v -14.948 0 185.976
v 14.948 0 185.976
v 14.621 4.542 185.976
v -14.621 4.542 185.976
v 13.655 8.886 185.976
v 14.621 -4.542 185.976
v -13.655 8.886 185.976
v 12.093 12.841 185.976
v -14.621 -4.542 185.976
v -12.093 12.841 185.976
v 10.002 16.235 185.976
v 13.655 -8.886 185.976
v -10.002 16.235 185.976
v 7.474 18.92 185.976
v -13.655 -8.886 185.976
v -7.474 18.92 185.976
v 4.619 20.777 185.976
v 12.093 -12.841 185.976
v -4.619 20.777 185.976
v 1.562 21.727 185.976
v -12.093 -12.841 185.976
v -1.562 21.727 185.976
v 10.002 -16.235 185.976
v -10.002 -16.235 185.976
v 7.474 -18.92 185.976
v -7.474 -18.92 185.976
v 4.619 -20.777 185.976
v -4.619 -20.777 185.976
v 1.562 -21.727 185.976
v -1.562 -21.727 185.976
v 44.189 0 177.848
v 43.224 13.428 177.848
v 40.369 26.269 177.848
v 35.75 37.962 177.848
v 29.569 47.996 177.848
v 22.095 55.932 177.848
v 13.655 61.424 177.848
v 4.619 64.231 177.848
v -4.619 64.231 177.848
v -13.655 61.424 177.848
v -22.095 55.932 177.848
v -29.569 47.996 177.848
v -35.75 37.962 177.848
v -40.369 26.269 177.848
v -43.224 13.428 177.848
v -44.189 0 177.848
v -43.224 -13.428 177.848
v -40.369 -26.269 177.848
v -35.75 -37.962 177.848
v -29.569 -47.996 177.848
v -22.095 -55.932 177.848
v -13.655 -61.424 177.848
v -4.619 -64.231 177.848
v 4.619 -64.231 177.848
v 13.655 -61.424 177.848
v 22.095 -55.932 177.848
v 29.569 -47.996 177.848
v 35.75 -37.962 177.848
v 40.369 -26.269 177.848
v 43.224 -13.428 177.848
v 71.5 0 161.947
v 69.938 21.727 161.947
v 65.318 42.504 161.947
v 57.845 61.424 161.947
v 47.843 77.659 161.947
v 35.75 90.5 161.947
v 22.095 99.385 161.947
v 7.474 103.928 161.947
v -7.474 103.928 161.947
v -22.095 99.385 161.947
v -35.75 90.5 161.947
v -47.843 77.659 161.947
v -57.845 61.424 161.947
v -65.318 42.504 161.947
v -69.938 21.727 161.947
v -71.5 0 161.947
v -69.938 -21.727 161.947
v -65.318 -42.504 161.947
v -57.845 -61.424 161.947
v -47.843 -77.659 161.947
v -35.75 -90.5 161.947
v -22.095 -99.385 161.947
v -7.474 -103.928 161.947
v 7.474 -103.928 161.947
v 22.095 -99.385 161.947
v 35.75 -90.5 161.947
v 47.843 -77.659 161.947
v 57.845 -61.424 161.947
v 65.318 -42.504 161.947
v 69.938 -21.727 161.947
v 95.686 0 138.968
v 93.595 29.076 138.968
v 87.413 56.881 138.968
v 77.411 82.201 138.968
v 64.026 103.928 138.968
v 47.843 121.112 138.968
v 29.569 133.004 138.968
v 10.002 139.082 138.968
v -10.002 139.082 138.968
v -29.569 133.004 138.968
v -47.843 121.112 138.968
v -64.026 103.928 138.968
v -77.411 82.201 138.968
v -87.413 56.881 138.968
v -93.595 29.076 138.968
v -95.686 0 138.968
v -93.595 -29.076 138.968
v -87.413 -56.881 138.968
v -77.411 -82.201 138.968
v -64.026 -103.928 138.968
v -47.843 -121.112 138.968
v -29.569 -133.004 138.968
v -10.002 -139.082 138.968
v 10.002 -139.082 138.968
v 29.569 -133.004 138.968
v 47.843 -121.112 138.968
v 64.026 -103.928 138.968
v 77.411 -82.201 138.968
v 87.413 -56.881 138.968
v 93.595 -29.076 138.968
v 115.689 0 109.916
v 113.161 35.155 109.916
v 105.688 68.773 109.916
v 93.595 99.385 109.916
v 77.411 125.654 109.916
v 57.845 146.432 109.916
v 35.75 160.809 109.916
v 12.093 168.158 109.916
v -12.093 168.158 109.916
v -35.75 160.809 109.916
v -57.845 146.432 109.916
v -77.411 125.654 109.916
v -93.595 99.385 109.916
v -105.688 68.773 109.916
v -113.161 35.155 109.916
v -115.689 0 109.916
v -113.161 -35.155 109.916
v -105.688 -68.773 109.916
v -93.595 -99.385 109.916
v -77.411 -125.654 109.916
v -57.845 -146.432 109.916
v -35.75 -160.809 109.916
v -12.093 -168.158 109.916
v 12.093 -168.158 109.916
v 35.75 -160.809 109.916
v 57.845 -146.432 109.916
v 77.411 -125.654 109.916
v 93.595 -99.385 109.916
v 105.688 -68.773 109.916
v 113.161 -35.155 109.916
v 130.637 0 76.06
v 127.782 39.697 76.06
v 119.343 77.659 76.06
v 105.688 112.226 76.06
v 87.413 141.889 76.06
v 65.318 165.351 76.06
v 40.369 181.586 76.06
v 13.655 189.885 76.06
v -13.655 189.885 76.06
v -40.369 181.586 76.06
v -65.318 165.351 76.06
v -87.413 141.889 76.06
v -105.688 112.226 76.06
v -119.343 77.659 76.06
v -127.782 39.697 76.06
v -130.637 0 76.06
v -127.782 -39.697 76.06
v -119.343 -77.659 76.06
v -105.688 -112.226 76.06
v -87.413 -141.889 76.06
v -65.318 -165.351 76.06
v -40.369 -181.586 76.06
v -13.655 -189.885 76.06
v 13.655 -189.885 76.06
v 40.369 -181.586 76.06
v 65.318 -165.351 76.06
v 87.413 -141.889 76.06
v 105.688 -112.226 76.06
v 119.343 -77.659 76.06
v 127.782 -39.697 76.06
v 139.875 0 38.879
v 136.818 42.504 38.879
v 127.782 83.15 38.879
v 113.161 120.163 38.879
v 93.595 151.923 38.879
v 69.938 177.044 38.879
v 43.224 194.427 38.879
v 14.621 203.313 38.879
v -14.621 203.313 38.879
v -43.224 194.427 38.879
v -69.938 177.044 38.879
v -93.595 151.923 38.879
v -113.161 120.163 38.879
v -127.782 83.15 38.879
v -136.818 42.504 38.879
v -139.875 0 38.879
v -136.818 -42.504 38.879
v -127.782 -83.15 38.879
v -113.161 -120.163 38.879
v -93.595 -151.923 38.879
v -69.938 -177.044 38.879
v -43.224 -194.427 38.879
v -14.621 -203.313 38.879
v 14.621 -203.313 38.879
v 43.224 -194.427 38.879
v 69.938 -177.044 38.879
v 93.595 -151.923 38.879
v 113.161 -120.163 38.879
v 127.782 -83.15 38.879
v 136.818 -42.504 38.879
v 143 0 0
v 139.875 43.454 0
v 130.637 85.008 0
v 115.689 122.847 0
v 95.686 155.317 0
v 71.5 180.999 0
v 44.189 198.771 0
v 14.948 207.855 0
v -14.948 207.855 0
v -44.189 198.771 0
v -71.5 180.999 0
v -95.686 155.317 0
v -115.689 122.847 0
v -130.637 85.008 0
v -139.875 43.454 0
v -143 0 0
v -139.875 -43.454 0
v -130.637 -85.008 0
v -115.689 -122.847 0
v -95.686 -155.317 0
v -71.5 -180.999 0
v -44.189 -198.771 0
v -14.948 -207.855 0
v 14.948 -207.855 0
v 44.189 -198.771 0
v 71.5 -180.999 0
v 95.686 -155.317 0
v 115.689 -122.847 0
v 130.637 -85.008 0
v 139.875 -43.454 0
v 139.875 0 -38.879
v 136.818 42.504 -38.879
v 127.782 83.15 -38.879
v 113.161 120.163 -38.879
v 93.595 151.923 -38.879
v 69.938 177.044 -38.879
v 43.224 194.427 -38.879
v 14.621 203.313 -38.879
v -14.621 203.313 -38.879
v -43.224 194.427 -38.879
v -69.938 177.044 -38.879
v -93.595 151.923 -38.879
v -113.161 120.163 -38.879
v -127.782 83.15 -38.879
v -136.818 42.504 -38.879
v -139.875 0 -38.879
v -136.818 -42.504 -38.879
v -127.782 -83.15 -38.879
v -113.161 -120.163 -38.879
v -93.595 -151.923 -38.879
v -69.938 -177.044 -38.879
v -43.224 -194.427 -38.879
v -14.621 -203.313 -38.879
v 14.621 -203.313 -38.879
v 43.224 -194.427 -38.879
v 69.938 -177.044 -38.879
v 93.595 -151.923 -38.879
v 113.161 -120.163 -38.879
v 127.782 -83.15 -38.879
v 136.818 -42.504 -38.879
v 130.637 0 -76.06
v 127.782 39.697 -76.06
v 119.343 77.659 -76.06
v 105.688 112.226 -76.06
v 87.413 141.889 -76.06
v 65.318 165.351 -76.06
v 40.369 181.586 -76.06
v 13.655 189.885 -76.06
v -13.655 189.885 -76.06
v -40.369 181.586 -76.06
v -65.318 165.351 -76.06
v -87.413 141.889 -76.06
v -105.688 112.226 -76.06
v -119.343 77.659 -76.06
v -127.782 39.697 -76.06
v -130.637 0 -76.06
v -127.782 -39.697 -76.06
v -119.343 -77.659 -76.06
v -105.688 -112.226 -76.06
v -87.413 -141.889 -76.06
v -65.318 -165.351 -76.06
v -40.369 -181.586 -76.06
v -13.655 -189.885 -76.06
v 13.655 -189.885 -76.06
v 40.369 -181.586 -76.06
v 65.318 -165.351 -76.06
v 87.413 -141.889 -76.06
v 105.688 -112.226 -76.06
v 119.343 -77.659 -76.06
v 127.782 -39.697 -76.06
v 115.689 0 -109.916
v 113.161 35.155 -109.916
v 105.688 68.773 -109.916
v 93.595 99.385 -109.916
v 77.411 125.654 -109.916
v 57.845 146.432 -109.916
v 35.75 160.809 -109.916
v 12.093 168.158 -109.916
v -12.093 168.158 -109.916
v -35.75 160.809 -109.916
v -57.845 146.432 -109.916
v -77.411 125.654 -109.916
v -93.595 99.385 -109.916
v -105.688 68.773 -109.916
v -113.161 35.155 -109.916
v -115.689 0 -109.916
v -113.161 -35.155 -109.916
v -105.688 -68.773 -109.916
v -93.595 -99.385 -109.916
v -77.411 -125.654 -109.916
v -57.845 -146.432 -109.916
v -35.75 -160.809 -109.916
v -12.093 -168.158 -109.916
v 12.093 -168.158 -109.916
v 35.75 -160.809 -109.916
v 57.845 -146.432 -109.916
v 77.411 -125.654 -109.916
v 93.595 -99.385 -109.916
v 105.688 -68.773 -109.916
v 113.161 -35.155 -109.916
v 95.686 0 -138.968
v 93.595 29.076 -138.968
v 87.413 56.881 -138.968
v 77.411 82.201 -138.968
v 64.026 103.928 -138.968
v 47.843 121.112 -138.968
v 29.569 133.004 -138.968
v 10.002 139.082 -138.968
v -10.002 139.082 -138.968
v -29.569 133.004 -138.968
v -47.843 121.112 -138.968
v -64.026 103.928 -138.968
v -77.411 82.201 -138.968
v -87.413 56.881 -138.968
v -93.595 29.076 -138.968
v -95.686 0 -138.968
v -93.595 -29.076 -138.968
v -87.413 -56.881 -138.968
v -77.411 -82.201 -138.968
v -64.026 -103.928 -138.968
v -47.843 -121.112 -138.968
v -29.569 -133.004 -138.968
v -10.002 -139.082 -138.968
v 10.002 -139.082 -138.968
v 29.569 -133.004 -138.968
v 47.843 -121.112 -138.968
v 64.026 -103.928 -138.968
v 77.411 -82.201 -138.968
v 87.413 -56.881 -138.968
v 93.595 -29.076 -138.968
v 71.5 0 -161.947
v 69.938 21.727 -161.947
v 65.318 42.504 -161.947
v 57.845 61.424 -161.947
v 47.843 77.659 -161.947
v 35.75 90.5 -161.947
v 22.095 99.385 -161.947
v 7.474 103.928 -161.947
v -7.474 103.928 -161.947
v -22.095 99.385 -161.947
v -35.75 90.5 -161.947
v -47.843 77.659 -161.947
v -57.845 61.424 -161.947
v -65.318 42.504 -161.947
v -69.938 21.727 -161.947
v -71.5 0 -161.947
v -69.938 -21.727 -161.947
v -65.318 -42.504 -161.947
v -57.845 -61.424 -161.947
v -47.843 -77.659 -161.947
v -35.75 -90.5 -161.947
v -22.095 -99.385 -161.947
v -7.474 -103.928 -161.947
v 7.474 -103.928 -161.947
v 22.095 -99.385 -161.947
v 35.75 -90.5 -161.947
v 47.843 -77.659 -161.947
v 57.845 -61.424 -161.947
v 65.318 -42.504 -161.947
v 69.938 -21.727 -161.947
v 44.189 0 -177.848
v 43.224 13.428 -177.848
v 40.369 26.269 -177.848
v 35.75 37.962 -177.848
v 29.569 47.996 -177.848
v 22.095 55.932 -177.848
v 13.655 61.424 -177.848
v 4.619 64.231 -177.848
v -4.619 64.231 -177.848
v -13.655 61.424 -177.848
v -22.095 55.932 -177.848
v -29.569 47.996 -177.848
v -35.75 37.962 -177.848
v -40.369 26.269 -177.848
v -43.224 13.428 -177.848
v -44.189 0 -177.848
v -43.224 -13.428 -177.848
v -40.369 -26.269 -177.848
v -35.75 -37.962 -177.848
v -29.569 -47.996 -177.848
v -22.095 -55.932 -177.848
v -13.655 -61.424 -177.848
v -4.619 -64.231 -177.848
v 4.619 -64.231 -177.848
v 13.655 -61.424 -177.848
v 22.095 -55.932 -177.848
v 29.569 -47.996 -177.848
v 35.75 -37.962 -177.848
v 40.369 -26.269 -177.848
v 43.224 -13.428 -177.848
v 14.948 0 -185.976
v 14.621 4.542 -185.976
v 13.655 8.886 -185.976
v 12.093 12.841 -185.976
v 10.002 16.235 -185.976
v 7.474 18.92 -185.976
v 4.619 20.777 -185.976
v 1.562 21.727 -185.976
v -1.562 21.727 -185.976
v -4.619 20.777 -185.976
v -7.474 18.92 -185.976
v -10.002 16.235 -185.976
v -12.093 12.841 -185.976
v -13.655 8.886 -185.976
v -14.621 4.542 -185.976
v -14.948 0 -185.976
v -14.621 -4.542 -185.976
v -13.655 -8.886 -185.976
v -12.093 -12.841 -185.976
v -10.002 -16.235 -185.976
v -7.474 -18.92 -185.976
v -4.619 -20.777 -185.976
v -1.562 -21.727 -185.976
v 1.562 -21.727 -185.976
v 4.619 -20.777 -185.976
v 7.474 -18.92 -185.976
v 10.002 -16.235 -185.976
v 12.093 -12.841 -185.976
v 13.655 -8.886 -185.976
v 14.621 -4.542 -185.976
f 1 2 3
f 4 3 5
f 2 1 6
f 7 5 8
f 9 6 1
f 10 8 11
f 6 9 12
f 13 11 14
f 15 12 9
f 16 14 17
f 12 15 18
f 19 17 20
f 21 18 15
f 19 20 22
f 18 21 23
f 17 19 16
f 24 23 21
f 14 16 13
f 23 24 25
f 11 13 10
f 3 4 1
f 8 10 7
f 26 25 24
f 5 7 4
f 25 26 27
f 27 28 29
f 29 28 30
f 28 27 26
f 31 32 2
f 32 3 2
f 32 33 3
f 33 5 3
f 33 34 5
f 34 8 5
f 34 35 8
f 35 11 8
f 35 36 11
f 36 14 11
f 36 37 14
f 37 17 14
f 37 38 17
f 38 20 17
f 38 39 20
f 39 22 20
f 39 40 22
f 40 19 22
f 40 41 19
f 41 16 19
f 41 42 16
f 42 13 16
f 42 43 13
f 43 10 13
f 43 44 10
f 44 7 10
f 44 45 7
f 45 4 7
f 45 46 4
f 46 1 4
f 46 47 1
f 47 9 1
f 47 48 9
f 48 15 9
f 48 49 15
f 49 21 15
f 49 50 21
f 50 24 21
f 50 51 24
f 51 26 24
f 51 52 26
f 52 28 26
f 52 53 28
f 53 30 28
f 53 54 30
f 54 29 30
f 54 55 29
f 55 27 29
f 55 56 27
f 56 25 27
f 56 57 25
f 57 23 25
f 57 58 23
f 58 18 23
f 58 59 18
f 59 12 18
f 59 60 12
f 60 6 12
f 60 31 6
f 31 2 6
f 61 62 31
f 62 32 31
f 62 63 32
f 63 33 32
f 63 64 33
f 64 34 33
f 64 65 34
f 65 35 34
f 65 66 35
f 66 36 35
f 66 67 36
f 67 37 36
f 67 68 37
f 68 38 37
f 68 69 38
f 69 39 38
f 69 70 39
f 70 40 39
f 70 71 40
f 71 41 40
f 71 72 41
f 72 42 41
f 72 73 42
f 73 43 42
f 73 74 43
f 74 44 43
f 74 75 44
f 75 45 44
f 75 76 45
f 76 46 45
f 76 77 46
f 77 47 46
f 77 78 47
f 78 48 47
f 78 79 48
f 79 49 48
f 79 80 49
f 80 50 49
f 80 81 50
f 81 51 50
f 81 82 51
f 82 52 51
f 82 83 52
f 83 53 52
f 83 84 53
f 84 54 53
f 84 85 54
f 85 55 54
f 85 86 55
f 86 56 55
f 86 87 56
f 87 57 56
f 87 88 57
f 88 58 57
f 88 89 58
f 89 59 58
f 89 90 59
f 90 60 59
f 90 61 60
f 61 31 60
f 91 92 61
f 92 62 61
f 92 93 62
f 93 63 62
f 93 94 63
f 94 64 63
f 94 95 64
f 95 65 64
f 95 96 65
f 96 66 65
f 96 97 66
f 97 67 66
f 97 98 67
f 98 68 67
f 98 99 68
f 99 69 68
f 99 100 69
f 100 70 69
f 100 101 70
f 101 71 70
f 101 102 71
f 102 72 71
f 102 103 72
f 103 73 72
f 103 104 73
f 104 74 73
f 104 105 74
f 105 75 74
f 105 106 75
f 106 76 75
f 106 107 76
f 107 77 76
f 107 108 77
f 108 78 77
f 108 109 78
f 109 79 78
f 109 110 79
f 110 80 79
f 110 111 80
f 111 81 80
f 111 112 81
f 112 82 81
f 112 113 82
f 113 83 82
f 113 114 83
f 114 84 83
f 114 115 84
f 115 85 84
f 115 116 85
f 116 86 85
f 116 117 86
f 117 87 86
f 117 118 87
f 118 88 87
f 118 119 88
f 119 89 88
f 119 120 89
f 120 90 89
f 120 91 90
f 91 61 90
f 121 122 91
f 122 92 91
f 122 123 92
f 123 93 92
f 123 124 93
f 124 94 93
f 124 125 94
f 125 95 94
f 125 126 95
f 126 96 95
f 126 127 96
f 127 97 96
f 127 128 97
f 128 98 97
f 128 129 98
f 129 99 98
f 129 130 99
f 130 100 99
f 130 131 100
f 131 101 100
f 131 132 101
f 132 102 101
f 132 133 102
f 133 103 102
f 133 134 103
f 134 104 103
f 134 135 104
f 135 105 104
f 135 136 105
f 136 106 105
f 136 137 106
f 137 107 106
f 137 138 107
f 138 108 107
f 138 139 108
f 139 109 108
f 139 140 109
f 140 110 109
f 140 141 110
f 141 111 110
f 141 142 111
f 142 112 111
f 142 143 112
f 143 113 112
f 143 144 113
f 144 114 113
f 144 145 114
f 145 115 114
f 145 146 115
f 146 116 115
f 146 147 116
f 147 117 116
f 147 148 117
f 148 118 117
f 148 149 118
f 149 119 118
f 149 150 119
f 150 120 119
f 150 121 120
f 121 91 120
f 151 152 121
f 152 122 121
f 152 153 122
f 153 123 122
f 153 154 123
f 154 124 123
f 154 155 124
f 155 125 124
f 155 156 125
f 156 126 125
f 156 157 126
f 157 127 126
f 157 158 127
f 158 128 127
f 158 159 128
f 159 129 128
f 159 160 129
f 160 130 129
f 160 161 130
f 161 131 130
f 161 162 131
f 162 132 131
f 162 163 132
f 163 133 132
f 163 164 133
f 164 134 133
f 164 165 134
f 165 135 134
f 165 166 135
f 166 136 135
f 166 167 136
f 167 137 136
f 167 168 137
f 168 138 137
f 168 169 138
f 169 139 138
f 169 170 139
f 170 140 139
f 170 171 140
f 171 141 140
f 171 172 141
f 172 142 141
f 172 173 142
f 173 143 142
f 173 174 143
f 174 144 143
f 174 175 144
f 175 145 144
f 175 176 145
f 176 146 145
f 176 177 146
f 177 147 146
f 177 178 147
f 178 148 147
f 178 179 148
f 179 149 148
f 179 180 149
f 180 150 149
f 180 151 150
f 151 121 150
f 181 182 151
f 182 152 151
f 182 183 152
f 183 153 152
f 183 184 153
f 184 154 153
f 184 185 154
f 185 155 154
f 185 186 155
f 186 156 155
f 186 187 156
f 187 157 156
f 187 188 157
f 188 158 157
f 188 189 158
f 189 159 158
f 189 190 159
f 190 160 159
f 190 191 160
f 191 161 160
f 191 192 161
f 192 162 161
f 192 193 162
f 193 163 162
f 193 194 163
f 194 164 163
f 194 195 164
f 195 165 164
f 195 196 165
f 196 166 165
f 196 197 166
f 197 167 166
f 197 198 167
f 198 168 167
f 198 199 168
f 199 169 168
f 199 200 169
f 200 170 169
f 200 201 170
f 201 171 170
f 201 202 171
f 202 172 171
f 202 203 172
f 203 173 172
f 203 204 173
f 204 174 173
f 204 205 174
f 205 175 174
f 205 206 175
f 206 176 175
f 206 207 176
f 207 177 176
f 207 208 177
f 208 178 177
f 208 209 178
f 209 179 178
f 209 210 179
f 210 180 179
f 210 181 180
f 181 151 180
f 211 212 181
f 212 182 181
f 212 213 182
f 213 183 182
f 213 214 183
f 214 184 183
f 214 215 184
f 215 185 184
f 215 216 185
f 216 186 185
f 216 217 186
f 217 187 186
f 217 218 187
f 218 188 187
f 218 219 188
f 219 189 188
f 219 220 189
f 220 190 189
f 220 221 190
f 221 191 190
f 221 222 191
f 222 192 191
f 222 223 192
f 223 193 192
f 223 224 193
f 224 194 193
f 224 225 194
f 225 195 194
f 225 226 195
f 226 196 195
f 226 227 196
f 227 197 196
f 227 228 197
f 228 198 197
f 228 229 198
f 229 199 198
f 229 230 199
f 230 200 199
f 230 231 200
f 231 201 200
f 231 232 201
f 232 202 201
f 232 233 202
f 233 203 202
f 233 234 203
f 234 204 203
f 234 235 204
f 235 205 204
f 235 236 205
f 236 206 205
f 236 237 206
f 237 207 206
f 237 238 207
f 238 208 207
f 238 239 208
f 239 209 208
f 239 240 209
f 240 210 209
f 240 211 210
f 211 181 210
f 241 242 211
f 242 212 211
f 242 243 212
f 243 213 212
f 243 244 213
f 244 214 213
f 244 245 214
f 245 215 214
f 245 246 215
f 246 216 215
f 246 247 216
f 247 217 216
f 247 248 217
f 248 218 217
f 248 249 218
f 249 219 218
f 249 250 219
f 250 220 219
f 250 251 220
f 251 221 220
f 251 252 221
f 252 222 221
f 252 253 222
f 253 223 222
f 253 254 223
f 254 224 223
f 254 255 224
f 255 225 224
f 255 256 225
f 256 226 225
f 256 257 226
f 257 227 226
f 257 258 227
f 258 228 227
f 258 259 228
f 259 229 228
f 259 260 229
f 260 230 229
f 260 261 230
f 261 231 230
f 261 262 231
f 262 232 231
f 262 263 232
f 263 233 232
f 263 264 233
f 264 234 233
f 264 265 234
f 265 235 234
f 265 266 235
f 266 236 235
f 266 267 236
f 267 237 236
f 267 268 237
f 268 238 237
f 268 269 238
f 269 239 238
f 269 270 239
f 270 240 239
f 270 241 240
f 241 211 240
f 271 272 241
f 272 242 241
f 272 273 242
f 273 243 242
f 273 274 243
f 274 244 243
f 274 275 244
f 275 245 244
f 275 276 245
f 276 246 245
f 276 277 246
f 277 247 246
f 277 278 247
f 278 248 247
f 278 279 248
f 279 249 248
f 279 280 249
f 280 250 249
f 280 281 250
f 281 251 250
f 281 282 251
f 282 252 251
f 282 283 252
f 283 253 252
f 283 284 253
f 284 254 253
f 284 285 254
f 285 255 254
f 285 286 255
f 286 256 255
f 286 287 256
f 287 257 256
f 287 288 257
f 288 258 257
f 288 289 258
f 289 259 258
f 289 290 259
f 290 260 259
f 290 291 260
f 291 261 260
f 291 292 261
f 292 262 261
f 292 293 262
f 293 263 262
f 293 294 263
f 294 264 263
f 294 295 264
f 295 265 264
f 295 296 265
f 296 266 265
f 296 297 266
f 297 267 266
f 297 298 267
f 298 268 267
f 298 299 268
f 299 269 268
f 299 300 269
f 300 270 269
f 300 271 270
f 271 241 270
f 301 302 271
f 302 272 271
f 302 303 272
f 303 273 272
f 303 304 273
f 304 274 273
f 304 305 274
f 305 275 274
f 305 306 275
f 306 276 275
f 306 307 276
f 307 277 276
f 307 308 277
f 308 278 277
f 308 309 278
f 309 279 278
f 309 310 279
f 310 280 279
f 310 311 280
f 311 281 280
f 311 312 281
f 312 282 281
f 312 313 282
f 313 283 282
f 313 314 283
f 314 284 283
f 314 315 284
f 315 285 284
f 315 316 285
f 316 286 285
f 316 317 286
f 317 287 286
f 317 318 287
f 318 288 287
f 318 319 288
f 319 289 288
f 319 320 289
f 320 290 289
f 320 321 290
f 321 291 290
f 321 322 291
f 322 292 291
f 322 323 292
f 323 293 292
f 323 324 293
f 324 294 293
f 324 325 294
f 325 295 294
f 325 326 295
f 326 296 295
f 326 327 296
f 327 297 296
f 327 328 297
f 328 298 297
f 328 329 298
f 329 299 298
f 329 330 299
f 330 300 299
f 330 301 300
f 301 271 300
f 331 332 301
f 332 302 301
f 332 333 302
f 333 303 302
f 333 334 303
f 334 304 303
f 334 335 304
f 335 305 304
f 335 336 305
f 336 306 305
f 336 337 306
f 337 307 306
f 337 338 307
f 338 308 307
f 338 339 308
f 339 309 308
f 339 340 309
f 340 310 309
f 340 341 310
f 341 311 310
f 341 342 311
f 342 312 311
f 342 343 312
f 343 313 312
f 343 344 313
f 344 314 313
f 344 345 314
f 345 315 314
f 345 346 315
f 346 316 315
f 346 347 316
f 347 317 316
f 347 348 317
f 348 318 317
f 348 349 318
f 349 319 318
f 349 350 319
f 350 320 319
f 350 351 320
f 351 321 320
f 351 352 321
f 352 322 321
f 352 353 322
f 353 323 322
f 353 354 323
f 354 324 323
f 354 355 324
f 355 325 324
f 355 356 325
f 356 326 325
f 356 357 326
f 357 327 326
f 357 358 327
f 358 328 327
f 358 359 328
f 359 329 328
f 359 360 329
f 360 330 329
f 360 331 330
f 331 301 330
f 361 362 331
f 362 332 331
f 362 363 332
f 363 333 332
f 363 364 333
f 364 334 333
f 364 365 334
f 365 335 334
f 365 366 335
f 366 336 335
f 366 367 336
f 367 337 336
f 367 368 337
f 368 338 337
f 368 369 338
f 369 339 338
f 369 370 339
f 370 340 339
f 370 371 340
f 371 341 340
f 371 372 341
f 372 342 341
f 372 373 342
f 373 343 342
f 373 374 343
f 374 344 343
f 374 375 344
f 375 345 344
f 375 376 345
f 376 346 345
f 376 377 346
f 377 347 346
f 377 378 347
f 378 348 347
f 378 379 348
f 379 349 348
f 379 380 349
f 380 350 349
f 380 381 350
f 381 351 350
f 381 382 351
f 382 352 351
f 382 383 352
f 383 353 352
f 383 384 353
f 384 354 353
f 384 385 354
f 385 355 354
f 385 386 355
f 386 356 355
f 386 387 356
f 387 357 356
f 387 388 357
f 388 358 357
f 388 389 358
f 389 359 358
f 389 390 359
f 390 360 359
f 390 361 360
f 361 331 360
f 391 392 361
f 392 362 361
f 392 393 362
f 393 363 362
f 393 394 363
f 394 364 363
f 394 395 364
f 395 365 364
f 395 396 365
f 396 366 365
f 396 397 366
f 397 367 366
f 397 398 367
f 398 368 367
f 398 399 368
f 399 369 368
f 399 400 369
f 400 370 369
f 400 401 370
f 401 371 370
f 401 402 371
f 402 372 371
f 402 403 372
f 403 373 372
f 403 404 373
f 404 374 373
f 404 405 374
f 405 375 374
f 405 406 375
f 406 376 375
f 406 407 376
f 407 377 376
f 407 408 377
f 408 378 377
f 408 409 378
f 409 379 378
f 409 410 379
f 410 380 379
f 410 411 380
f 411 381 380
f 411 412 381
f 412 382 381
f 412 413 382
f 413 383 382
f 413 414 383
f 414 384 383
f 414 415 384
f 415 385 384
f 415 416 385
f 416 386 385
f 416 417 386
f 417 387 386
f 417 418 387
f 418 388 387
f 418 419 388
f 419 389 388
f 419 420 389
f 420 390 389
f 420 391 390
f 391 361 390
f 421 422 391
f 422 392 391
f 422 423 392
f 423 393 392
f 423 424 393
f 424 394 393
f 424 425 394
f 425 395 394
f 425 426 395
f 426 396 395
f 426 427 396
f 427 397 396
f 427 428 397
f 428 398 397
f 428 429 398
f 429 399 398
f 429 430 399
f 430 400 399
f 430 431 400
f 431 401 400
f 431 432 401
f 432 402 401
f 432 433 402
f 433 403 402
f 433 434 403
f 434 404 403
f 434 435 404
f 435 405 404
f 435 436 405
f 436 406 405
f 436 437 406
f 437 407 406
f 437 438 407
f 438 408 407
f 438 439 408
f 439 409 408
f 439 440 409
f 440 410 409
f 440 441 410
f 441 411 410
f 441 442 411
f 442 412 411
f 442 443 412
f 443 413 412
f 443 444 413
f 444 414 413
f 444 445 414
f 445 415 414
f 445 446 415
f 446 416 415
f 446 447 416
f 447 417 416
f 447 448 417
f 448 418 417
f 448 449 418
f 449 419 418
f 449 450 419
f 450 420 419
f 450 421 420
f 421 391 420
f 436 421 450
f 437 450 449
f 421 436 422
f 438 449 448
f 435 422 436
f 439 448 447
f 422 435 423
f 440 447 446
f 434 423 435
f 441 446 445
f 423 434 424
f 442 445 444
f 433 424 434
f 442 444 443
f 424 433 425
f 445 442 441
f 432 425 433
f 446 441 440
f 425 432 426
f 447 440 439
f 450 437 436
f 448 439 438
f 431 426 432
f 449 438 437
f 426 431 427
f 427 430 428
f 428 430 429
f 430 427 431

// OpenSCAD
// Generated by SolidPython 1.0.1 on 2020-07-29 00:46:51


scale(v = [13, 19, 17]) {
	sphere(r = 11);
}
/***********************************************
*********      SolidPython code:      **********
************************************************
 
# import packages: SolidPython
from solid import *
from solid.utils import *
from itertools import chain, combinations, permutations


class Resize:

    def __init__(self, scad_file):
        self.scad_file = scad_file
        #self.scad_file = import_scad(scad_file)
        # cone/cylinder param:
        self.r1 = 0
        self.r2 = 0
        self.h = 0
        # rectangular prism param:
        self.w = 0
        self.l = 0
        # ellipse param:
        self.r = 0

    # import OpenScad code (file name corresponds to shape)


    # classify shape + parameters
    def assign(self, param1, param2, param3):
        if self.scad_file == 'cone.scad':
            self.r1 = param1
            self.r2 = param2
            self.h = param3
        elif self.scad_file == 'cylinder.scad':
            self.r1 = param1
            self.r2 = param2
            self.h = param3
        elif self.scad_file == 'rectangularPrism.scad':
            self.h = param1
            self.l = param2
            self.w = param3
        else:
            self.r = param1
            self.h = param2

    # resize parameters
    def iterate(self):
        x = range(3, 20, 2)
        i = 1
        if self.scad_file == 'cone.scad':
            tempList = list(permutations(x, 2))
            for temp in tempList:
                param1 = temp[0]
                param2 = temp[1]
                filepath = 'produced_scad_files/' + 'cone' + str(param1) + '_' + str(param2) + '_' + '.scad'
                scad_render_to_file(cylinder(h=param1, r1=param2, r2=0), filepath)

        elif self.scad_file == 'cylinder.scad':
            tempList = list(permutations(x, 3))
            for temp in tempList:
                param1 = temp[0]
                param2 = temp[1]
                filepath = 'produced_scad_files/' + 'cylinder' + str(param1) + '_' + str(param2) + '_' + '.scad'
                scad_render_to_file(cylinder(h=param1, r1=param2, r2=param2), filepath)

        elif self.scad_file == 'rectangularPrism.scad':
            tempList = list(permutations(x, 3))
            for temp in tempList:
                param1 = temp[0]
                param2 = temp[1]
                param3 = temp[2]
                filepath = 'produced_scad_files/' + 'rectangularPrism' + str(param1) + '_' + str(param2) + '_' + str(
                    param3) + '.scad'
                scad_render_to_file(cube(size=(param1, param2, param3)), filepath)

        elif self.scad_file == 'ellipse.scad':
            tempList = list(permutations(x, 4))
            for temp in tempList:
                param1 = temp[0]
                param2 = temp[1]
                param3 = temp[2]
                param4 = temp[3]
                filepath = 'produced_scad_files/' + 'ellipse' + str(param1) + '_' + str(param2) + '_' + str(param3) + '_' + str(param4) + '.scad'
                scad_render_to_file(scale([param1, param2, param3])(sphere(r=param4)), filepath)

    def render_to_scadfile(self):
        scad_render_to_file(scad, 'example.scad') 
 
************************************************/
